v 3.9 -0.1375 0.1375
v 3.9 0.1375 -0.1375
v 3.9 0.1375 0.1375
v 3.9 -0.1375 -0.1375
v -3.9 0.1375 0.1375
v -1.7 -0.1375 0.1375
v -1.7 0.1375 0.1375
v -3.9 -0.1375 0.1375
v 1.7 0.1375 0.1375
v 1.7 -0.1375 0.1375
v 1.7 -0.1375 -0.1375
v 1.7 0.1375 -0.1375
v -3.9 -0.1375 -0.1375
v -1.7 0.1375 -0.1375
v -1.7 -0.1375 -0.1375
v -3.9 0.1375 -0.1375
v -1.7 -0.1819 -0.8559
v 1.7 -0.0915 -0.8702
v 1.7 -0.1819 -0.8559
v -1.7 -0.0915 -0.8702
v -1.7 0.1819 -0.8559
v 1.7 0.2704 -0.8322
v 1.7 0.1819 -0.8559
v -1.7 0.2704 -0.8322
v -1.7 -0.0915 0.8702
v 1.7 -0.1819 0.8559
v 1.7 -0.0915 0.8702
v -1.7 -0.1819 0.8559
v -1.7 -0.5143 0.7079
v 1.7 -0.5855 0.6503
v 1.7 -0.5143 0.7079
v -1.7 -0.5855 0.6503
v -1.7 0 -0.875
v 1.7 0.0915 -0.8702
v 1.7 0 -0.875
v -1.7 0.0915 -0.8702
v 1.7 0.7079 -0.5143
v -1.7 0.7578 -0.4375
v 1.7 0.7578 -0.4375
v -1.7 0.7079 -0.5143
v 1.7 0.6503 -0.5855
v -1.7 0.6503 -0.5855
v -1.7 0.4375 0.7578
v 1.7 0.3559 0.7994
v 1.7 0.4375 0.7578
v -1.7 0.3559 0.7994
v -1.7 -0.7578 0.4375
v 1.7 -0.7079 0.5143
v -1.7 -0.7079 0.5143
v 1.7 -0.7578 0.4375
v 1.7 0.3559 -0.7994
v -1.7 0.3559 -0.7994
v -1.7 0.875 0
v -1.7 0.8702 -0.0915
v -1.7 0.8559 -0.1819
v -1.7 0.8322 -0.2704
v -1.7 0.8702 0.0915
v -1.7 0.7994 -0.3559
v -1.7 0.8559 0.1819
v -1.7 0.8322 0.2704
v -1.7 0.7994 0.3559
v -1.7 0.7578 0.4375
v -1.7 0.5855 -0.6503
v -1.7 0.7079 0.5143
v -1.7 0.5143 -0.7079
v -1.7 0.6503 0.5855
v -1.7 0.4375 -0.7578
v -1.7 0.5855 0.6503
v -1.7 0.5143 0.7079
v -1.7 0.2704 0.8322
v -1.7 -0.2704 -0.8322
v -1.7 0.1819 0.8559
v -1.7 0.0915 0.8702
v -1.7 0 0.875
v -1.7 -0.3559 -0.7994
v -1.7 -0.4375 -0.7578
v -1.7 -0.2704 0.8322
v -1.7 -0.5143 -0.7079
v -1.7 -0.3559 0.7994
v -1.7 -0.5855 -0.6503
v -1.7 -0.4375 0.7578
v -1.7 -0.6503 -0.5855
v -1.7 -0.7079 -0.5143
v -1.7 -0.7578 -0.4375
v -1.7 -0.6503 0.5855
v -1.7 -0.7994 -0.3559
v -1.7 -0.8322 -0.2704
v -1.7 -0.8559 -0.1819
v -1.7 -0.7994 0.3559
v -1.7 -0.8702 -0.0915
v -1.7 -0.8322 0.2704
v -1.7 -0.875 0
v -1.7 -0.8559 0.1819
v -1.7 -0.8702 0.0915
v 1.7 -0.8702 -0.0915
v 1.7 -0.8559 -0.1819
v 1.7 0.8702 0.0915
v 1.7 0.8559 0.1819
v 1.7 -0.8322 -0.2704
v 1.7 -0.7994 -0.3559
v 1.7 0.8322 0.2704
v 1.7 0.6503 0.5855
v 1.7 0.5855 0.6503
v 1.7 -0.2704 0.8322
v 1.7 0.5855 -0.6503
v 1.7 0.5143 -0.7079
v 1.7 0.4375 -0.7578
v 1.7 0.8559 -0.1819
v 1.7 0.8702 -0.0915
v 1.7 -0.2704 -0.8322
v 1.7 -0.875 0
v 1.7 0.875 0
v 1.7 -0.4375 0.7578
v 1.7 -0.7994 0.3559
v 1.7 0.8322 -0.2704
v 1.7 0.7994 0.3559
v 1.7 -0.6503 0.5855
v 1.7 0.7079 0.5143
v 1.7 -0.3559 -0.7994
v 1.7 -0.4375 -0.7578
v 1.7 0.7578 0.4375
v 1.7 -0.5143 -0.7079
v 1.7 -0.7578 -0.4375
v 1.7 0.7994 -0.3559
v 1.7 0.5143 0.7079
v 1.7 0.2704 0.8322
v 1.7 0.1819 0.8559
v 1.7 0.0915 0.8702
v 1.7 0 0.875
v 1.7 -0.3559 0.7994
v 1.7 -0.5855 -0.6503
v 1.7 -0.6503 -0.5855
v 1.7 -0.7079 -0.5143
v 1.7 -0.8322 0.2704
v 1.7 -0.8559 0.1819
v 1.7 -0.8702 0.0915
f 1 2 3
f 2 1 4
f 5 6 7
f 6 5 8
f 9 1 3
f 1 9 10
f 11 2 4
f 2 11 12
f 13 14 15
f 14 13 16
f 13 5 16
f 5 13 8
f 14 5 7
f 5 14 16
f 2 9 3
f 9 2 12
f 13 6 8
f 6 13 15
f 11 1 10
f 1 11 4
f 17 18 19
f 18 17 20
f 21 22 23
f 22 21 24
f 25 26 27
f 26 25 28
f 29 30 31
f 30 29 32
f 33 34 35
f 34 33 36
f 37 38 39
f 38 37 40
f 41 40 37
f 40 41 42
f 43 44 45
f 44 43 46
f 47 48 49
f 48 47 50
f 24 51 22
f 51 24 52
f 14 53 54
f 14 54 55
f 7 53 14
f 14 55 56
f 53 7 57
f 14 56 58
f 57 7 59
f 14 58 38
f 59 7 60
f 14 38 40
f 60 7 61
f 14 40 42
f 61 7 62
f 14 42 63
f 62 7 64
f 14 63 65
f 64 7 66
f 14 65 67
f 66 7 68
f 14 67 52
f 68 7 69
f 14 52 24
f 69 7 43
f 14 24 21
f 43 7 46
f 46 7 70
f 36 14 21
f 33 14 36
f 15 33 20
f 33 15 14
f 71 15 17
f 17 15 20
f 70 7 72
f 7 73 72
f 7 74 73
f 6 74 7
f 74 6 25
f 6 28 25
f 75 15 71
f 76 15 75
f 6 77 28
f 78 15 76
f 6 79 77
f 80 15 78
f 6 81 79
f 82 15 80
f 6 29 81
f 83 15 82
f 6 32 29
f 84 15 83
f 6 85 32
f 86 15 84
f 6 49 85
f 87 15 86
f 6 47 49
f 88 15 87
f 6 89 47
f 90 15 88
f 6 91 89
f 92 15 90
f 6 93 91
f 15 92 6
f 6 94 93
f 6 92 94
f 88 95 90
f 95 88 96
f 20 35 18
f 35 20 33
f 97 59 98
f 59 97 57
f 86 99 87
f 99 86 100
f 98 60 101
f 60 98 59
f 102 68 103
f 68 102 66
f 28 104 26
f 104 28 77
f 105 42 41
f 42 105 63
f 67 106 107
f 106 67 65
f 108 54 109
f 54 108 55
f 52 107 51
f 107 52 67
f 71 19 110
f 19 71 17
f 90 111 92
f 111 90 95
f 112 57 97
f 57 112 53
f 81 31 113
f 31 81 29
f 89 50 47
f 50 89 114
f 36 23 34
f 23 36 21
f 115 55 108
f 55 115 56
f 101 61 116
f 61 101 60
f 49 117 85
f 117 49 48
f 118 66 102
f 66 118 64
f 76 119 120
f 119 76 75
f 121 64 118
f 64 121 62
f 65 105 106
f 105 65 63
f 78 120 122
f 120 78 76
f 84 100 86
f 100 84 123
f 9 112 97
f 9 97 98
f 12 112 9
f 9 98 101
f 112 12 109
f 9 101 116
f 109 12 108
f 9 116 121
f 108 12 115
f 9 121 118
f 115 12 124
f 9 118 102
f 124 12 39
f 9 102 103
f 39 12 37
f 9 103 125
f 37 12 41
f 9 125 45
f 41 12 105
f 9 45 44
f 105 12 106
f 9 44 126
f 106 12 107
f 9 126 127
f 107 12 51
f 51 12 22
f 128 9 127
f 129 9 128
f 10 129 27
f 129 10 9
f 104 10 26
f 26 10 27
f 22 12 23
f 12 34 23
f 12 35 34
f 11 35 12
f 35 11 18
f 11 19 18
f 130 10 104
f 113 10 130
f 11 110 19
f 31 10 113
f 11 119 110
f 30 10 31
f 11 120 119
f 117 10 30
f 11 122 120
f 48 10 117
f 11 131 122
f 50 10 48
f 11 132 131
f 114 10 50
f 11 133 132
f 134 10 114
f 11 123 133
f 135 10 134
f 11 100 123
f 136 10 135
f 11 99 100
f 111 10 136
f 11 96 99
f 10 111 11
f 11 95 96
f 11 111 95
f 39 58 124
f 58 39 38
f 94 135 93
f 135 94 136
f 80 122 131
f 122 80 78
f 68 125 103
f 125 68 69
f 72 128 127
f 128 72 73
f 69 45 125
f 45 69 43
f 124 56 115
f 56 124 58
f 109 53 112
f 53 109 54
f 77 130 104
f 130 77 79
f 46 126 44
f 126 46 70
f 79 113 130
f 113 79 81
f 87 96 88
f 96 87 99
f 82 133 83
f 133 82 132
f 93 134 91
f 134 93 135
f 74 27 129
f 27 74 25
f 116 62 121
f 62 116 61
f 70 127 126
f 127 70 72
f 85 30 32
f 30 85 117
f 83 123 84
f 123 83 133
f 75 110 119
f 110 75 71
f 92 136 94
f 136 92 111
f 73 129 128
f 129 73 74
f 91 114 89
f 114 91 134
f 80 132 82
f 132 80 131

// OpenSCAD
$fn = 60;

lead_spacing = 7.8;
lead_diameter = 0.55;
part_diameter = 1.75;
part_length = 3.4;

qty = 10;

translate([-lead_spacing/2, -lead_diameter/2/2, -lead_diameter/2/2])
cube([lead_spacing, lead_diameter/2, lead_diameter/2]);

rotate([0, 90, 0])
cylinder(r = part_diameter/2, h = part_length, center=true);
